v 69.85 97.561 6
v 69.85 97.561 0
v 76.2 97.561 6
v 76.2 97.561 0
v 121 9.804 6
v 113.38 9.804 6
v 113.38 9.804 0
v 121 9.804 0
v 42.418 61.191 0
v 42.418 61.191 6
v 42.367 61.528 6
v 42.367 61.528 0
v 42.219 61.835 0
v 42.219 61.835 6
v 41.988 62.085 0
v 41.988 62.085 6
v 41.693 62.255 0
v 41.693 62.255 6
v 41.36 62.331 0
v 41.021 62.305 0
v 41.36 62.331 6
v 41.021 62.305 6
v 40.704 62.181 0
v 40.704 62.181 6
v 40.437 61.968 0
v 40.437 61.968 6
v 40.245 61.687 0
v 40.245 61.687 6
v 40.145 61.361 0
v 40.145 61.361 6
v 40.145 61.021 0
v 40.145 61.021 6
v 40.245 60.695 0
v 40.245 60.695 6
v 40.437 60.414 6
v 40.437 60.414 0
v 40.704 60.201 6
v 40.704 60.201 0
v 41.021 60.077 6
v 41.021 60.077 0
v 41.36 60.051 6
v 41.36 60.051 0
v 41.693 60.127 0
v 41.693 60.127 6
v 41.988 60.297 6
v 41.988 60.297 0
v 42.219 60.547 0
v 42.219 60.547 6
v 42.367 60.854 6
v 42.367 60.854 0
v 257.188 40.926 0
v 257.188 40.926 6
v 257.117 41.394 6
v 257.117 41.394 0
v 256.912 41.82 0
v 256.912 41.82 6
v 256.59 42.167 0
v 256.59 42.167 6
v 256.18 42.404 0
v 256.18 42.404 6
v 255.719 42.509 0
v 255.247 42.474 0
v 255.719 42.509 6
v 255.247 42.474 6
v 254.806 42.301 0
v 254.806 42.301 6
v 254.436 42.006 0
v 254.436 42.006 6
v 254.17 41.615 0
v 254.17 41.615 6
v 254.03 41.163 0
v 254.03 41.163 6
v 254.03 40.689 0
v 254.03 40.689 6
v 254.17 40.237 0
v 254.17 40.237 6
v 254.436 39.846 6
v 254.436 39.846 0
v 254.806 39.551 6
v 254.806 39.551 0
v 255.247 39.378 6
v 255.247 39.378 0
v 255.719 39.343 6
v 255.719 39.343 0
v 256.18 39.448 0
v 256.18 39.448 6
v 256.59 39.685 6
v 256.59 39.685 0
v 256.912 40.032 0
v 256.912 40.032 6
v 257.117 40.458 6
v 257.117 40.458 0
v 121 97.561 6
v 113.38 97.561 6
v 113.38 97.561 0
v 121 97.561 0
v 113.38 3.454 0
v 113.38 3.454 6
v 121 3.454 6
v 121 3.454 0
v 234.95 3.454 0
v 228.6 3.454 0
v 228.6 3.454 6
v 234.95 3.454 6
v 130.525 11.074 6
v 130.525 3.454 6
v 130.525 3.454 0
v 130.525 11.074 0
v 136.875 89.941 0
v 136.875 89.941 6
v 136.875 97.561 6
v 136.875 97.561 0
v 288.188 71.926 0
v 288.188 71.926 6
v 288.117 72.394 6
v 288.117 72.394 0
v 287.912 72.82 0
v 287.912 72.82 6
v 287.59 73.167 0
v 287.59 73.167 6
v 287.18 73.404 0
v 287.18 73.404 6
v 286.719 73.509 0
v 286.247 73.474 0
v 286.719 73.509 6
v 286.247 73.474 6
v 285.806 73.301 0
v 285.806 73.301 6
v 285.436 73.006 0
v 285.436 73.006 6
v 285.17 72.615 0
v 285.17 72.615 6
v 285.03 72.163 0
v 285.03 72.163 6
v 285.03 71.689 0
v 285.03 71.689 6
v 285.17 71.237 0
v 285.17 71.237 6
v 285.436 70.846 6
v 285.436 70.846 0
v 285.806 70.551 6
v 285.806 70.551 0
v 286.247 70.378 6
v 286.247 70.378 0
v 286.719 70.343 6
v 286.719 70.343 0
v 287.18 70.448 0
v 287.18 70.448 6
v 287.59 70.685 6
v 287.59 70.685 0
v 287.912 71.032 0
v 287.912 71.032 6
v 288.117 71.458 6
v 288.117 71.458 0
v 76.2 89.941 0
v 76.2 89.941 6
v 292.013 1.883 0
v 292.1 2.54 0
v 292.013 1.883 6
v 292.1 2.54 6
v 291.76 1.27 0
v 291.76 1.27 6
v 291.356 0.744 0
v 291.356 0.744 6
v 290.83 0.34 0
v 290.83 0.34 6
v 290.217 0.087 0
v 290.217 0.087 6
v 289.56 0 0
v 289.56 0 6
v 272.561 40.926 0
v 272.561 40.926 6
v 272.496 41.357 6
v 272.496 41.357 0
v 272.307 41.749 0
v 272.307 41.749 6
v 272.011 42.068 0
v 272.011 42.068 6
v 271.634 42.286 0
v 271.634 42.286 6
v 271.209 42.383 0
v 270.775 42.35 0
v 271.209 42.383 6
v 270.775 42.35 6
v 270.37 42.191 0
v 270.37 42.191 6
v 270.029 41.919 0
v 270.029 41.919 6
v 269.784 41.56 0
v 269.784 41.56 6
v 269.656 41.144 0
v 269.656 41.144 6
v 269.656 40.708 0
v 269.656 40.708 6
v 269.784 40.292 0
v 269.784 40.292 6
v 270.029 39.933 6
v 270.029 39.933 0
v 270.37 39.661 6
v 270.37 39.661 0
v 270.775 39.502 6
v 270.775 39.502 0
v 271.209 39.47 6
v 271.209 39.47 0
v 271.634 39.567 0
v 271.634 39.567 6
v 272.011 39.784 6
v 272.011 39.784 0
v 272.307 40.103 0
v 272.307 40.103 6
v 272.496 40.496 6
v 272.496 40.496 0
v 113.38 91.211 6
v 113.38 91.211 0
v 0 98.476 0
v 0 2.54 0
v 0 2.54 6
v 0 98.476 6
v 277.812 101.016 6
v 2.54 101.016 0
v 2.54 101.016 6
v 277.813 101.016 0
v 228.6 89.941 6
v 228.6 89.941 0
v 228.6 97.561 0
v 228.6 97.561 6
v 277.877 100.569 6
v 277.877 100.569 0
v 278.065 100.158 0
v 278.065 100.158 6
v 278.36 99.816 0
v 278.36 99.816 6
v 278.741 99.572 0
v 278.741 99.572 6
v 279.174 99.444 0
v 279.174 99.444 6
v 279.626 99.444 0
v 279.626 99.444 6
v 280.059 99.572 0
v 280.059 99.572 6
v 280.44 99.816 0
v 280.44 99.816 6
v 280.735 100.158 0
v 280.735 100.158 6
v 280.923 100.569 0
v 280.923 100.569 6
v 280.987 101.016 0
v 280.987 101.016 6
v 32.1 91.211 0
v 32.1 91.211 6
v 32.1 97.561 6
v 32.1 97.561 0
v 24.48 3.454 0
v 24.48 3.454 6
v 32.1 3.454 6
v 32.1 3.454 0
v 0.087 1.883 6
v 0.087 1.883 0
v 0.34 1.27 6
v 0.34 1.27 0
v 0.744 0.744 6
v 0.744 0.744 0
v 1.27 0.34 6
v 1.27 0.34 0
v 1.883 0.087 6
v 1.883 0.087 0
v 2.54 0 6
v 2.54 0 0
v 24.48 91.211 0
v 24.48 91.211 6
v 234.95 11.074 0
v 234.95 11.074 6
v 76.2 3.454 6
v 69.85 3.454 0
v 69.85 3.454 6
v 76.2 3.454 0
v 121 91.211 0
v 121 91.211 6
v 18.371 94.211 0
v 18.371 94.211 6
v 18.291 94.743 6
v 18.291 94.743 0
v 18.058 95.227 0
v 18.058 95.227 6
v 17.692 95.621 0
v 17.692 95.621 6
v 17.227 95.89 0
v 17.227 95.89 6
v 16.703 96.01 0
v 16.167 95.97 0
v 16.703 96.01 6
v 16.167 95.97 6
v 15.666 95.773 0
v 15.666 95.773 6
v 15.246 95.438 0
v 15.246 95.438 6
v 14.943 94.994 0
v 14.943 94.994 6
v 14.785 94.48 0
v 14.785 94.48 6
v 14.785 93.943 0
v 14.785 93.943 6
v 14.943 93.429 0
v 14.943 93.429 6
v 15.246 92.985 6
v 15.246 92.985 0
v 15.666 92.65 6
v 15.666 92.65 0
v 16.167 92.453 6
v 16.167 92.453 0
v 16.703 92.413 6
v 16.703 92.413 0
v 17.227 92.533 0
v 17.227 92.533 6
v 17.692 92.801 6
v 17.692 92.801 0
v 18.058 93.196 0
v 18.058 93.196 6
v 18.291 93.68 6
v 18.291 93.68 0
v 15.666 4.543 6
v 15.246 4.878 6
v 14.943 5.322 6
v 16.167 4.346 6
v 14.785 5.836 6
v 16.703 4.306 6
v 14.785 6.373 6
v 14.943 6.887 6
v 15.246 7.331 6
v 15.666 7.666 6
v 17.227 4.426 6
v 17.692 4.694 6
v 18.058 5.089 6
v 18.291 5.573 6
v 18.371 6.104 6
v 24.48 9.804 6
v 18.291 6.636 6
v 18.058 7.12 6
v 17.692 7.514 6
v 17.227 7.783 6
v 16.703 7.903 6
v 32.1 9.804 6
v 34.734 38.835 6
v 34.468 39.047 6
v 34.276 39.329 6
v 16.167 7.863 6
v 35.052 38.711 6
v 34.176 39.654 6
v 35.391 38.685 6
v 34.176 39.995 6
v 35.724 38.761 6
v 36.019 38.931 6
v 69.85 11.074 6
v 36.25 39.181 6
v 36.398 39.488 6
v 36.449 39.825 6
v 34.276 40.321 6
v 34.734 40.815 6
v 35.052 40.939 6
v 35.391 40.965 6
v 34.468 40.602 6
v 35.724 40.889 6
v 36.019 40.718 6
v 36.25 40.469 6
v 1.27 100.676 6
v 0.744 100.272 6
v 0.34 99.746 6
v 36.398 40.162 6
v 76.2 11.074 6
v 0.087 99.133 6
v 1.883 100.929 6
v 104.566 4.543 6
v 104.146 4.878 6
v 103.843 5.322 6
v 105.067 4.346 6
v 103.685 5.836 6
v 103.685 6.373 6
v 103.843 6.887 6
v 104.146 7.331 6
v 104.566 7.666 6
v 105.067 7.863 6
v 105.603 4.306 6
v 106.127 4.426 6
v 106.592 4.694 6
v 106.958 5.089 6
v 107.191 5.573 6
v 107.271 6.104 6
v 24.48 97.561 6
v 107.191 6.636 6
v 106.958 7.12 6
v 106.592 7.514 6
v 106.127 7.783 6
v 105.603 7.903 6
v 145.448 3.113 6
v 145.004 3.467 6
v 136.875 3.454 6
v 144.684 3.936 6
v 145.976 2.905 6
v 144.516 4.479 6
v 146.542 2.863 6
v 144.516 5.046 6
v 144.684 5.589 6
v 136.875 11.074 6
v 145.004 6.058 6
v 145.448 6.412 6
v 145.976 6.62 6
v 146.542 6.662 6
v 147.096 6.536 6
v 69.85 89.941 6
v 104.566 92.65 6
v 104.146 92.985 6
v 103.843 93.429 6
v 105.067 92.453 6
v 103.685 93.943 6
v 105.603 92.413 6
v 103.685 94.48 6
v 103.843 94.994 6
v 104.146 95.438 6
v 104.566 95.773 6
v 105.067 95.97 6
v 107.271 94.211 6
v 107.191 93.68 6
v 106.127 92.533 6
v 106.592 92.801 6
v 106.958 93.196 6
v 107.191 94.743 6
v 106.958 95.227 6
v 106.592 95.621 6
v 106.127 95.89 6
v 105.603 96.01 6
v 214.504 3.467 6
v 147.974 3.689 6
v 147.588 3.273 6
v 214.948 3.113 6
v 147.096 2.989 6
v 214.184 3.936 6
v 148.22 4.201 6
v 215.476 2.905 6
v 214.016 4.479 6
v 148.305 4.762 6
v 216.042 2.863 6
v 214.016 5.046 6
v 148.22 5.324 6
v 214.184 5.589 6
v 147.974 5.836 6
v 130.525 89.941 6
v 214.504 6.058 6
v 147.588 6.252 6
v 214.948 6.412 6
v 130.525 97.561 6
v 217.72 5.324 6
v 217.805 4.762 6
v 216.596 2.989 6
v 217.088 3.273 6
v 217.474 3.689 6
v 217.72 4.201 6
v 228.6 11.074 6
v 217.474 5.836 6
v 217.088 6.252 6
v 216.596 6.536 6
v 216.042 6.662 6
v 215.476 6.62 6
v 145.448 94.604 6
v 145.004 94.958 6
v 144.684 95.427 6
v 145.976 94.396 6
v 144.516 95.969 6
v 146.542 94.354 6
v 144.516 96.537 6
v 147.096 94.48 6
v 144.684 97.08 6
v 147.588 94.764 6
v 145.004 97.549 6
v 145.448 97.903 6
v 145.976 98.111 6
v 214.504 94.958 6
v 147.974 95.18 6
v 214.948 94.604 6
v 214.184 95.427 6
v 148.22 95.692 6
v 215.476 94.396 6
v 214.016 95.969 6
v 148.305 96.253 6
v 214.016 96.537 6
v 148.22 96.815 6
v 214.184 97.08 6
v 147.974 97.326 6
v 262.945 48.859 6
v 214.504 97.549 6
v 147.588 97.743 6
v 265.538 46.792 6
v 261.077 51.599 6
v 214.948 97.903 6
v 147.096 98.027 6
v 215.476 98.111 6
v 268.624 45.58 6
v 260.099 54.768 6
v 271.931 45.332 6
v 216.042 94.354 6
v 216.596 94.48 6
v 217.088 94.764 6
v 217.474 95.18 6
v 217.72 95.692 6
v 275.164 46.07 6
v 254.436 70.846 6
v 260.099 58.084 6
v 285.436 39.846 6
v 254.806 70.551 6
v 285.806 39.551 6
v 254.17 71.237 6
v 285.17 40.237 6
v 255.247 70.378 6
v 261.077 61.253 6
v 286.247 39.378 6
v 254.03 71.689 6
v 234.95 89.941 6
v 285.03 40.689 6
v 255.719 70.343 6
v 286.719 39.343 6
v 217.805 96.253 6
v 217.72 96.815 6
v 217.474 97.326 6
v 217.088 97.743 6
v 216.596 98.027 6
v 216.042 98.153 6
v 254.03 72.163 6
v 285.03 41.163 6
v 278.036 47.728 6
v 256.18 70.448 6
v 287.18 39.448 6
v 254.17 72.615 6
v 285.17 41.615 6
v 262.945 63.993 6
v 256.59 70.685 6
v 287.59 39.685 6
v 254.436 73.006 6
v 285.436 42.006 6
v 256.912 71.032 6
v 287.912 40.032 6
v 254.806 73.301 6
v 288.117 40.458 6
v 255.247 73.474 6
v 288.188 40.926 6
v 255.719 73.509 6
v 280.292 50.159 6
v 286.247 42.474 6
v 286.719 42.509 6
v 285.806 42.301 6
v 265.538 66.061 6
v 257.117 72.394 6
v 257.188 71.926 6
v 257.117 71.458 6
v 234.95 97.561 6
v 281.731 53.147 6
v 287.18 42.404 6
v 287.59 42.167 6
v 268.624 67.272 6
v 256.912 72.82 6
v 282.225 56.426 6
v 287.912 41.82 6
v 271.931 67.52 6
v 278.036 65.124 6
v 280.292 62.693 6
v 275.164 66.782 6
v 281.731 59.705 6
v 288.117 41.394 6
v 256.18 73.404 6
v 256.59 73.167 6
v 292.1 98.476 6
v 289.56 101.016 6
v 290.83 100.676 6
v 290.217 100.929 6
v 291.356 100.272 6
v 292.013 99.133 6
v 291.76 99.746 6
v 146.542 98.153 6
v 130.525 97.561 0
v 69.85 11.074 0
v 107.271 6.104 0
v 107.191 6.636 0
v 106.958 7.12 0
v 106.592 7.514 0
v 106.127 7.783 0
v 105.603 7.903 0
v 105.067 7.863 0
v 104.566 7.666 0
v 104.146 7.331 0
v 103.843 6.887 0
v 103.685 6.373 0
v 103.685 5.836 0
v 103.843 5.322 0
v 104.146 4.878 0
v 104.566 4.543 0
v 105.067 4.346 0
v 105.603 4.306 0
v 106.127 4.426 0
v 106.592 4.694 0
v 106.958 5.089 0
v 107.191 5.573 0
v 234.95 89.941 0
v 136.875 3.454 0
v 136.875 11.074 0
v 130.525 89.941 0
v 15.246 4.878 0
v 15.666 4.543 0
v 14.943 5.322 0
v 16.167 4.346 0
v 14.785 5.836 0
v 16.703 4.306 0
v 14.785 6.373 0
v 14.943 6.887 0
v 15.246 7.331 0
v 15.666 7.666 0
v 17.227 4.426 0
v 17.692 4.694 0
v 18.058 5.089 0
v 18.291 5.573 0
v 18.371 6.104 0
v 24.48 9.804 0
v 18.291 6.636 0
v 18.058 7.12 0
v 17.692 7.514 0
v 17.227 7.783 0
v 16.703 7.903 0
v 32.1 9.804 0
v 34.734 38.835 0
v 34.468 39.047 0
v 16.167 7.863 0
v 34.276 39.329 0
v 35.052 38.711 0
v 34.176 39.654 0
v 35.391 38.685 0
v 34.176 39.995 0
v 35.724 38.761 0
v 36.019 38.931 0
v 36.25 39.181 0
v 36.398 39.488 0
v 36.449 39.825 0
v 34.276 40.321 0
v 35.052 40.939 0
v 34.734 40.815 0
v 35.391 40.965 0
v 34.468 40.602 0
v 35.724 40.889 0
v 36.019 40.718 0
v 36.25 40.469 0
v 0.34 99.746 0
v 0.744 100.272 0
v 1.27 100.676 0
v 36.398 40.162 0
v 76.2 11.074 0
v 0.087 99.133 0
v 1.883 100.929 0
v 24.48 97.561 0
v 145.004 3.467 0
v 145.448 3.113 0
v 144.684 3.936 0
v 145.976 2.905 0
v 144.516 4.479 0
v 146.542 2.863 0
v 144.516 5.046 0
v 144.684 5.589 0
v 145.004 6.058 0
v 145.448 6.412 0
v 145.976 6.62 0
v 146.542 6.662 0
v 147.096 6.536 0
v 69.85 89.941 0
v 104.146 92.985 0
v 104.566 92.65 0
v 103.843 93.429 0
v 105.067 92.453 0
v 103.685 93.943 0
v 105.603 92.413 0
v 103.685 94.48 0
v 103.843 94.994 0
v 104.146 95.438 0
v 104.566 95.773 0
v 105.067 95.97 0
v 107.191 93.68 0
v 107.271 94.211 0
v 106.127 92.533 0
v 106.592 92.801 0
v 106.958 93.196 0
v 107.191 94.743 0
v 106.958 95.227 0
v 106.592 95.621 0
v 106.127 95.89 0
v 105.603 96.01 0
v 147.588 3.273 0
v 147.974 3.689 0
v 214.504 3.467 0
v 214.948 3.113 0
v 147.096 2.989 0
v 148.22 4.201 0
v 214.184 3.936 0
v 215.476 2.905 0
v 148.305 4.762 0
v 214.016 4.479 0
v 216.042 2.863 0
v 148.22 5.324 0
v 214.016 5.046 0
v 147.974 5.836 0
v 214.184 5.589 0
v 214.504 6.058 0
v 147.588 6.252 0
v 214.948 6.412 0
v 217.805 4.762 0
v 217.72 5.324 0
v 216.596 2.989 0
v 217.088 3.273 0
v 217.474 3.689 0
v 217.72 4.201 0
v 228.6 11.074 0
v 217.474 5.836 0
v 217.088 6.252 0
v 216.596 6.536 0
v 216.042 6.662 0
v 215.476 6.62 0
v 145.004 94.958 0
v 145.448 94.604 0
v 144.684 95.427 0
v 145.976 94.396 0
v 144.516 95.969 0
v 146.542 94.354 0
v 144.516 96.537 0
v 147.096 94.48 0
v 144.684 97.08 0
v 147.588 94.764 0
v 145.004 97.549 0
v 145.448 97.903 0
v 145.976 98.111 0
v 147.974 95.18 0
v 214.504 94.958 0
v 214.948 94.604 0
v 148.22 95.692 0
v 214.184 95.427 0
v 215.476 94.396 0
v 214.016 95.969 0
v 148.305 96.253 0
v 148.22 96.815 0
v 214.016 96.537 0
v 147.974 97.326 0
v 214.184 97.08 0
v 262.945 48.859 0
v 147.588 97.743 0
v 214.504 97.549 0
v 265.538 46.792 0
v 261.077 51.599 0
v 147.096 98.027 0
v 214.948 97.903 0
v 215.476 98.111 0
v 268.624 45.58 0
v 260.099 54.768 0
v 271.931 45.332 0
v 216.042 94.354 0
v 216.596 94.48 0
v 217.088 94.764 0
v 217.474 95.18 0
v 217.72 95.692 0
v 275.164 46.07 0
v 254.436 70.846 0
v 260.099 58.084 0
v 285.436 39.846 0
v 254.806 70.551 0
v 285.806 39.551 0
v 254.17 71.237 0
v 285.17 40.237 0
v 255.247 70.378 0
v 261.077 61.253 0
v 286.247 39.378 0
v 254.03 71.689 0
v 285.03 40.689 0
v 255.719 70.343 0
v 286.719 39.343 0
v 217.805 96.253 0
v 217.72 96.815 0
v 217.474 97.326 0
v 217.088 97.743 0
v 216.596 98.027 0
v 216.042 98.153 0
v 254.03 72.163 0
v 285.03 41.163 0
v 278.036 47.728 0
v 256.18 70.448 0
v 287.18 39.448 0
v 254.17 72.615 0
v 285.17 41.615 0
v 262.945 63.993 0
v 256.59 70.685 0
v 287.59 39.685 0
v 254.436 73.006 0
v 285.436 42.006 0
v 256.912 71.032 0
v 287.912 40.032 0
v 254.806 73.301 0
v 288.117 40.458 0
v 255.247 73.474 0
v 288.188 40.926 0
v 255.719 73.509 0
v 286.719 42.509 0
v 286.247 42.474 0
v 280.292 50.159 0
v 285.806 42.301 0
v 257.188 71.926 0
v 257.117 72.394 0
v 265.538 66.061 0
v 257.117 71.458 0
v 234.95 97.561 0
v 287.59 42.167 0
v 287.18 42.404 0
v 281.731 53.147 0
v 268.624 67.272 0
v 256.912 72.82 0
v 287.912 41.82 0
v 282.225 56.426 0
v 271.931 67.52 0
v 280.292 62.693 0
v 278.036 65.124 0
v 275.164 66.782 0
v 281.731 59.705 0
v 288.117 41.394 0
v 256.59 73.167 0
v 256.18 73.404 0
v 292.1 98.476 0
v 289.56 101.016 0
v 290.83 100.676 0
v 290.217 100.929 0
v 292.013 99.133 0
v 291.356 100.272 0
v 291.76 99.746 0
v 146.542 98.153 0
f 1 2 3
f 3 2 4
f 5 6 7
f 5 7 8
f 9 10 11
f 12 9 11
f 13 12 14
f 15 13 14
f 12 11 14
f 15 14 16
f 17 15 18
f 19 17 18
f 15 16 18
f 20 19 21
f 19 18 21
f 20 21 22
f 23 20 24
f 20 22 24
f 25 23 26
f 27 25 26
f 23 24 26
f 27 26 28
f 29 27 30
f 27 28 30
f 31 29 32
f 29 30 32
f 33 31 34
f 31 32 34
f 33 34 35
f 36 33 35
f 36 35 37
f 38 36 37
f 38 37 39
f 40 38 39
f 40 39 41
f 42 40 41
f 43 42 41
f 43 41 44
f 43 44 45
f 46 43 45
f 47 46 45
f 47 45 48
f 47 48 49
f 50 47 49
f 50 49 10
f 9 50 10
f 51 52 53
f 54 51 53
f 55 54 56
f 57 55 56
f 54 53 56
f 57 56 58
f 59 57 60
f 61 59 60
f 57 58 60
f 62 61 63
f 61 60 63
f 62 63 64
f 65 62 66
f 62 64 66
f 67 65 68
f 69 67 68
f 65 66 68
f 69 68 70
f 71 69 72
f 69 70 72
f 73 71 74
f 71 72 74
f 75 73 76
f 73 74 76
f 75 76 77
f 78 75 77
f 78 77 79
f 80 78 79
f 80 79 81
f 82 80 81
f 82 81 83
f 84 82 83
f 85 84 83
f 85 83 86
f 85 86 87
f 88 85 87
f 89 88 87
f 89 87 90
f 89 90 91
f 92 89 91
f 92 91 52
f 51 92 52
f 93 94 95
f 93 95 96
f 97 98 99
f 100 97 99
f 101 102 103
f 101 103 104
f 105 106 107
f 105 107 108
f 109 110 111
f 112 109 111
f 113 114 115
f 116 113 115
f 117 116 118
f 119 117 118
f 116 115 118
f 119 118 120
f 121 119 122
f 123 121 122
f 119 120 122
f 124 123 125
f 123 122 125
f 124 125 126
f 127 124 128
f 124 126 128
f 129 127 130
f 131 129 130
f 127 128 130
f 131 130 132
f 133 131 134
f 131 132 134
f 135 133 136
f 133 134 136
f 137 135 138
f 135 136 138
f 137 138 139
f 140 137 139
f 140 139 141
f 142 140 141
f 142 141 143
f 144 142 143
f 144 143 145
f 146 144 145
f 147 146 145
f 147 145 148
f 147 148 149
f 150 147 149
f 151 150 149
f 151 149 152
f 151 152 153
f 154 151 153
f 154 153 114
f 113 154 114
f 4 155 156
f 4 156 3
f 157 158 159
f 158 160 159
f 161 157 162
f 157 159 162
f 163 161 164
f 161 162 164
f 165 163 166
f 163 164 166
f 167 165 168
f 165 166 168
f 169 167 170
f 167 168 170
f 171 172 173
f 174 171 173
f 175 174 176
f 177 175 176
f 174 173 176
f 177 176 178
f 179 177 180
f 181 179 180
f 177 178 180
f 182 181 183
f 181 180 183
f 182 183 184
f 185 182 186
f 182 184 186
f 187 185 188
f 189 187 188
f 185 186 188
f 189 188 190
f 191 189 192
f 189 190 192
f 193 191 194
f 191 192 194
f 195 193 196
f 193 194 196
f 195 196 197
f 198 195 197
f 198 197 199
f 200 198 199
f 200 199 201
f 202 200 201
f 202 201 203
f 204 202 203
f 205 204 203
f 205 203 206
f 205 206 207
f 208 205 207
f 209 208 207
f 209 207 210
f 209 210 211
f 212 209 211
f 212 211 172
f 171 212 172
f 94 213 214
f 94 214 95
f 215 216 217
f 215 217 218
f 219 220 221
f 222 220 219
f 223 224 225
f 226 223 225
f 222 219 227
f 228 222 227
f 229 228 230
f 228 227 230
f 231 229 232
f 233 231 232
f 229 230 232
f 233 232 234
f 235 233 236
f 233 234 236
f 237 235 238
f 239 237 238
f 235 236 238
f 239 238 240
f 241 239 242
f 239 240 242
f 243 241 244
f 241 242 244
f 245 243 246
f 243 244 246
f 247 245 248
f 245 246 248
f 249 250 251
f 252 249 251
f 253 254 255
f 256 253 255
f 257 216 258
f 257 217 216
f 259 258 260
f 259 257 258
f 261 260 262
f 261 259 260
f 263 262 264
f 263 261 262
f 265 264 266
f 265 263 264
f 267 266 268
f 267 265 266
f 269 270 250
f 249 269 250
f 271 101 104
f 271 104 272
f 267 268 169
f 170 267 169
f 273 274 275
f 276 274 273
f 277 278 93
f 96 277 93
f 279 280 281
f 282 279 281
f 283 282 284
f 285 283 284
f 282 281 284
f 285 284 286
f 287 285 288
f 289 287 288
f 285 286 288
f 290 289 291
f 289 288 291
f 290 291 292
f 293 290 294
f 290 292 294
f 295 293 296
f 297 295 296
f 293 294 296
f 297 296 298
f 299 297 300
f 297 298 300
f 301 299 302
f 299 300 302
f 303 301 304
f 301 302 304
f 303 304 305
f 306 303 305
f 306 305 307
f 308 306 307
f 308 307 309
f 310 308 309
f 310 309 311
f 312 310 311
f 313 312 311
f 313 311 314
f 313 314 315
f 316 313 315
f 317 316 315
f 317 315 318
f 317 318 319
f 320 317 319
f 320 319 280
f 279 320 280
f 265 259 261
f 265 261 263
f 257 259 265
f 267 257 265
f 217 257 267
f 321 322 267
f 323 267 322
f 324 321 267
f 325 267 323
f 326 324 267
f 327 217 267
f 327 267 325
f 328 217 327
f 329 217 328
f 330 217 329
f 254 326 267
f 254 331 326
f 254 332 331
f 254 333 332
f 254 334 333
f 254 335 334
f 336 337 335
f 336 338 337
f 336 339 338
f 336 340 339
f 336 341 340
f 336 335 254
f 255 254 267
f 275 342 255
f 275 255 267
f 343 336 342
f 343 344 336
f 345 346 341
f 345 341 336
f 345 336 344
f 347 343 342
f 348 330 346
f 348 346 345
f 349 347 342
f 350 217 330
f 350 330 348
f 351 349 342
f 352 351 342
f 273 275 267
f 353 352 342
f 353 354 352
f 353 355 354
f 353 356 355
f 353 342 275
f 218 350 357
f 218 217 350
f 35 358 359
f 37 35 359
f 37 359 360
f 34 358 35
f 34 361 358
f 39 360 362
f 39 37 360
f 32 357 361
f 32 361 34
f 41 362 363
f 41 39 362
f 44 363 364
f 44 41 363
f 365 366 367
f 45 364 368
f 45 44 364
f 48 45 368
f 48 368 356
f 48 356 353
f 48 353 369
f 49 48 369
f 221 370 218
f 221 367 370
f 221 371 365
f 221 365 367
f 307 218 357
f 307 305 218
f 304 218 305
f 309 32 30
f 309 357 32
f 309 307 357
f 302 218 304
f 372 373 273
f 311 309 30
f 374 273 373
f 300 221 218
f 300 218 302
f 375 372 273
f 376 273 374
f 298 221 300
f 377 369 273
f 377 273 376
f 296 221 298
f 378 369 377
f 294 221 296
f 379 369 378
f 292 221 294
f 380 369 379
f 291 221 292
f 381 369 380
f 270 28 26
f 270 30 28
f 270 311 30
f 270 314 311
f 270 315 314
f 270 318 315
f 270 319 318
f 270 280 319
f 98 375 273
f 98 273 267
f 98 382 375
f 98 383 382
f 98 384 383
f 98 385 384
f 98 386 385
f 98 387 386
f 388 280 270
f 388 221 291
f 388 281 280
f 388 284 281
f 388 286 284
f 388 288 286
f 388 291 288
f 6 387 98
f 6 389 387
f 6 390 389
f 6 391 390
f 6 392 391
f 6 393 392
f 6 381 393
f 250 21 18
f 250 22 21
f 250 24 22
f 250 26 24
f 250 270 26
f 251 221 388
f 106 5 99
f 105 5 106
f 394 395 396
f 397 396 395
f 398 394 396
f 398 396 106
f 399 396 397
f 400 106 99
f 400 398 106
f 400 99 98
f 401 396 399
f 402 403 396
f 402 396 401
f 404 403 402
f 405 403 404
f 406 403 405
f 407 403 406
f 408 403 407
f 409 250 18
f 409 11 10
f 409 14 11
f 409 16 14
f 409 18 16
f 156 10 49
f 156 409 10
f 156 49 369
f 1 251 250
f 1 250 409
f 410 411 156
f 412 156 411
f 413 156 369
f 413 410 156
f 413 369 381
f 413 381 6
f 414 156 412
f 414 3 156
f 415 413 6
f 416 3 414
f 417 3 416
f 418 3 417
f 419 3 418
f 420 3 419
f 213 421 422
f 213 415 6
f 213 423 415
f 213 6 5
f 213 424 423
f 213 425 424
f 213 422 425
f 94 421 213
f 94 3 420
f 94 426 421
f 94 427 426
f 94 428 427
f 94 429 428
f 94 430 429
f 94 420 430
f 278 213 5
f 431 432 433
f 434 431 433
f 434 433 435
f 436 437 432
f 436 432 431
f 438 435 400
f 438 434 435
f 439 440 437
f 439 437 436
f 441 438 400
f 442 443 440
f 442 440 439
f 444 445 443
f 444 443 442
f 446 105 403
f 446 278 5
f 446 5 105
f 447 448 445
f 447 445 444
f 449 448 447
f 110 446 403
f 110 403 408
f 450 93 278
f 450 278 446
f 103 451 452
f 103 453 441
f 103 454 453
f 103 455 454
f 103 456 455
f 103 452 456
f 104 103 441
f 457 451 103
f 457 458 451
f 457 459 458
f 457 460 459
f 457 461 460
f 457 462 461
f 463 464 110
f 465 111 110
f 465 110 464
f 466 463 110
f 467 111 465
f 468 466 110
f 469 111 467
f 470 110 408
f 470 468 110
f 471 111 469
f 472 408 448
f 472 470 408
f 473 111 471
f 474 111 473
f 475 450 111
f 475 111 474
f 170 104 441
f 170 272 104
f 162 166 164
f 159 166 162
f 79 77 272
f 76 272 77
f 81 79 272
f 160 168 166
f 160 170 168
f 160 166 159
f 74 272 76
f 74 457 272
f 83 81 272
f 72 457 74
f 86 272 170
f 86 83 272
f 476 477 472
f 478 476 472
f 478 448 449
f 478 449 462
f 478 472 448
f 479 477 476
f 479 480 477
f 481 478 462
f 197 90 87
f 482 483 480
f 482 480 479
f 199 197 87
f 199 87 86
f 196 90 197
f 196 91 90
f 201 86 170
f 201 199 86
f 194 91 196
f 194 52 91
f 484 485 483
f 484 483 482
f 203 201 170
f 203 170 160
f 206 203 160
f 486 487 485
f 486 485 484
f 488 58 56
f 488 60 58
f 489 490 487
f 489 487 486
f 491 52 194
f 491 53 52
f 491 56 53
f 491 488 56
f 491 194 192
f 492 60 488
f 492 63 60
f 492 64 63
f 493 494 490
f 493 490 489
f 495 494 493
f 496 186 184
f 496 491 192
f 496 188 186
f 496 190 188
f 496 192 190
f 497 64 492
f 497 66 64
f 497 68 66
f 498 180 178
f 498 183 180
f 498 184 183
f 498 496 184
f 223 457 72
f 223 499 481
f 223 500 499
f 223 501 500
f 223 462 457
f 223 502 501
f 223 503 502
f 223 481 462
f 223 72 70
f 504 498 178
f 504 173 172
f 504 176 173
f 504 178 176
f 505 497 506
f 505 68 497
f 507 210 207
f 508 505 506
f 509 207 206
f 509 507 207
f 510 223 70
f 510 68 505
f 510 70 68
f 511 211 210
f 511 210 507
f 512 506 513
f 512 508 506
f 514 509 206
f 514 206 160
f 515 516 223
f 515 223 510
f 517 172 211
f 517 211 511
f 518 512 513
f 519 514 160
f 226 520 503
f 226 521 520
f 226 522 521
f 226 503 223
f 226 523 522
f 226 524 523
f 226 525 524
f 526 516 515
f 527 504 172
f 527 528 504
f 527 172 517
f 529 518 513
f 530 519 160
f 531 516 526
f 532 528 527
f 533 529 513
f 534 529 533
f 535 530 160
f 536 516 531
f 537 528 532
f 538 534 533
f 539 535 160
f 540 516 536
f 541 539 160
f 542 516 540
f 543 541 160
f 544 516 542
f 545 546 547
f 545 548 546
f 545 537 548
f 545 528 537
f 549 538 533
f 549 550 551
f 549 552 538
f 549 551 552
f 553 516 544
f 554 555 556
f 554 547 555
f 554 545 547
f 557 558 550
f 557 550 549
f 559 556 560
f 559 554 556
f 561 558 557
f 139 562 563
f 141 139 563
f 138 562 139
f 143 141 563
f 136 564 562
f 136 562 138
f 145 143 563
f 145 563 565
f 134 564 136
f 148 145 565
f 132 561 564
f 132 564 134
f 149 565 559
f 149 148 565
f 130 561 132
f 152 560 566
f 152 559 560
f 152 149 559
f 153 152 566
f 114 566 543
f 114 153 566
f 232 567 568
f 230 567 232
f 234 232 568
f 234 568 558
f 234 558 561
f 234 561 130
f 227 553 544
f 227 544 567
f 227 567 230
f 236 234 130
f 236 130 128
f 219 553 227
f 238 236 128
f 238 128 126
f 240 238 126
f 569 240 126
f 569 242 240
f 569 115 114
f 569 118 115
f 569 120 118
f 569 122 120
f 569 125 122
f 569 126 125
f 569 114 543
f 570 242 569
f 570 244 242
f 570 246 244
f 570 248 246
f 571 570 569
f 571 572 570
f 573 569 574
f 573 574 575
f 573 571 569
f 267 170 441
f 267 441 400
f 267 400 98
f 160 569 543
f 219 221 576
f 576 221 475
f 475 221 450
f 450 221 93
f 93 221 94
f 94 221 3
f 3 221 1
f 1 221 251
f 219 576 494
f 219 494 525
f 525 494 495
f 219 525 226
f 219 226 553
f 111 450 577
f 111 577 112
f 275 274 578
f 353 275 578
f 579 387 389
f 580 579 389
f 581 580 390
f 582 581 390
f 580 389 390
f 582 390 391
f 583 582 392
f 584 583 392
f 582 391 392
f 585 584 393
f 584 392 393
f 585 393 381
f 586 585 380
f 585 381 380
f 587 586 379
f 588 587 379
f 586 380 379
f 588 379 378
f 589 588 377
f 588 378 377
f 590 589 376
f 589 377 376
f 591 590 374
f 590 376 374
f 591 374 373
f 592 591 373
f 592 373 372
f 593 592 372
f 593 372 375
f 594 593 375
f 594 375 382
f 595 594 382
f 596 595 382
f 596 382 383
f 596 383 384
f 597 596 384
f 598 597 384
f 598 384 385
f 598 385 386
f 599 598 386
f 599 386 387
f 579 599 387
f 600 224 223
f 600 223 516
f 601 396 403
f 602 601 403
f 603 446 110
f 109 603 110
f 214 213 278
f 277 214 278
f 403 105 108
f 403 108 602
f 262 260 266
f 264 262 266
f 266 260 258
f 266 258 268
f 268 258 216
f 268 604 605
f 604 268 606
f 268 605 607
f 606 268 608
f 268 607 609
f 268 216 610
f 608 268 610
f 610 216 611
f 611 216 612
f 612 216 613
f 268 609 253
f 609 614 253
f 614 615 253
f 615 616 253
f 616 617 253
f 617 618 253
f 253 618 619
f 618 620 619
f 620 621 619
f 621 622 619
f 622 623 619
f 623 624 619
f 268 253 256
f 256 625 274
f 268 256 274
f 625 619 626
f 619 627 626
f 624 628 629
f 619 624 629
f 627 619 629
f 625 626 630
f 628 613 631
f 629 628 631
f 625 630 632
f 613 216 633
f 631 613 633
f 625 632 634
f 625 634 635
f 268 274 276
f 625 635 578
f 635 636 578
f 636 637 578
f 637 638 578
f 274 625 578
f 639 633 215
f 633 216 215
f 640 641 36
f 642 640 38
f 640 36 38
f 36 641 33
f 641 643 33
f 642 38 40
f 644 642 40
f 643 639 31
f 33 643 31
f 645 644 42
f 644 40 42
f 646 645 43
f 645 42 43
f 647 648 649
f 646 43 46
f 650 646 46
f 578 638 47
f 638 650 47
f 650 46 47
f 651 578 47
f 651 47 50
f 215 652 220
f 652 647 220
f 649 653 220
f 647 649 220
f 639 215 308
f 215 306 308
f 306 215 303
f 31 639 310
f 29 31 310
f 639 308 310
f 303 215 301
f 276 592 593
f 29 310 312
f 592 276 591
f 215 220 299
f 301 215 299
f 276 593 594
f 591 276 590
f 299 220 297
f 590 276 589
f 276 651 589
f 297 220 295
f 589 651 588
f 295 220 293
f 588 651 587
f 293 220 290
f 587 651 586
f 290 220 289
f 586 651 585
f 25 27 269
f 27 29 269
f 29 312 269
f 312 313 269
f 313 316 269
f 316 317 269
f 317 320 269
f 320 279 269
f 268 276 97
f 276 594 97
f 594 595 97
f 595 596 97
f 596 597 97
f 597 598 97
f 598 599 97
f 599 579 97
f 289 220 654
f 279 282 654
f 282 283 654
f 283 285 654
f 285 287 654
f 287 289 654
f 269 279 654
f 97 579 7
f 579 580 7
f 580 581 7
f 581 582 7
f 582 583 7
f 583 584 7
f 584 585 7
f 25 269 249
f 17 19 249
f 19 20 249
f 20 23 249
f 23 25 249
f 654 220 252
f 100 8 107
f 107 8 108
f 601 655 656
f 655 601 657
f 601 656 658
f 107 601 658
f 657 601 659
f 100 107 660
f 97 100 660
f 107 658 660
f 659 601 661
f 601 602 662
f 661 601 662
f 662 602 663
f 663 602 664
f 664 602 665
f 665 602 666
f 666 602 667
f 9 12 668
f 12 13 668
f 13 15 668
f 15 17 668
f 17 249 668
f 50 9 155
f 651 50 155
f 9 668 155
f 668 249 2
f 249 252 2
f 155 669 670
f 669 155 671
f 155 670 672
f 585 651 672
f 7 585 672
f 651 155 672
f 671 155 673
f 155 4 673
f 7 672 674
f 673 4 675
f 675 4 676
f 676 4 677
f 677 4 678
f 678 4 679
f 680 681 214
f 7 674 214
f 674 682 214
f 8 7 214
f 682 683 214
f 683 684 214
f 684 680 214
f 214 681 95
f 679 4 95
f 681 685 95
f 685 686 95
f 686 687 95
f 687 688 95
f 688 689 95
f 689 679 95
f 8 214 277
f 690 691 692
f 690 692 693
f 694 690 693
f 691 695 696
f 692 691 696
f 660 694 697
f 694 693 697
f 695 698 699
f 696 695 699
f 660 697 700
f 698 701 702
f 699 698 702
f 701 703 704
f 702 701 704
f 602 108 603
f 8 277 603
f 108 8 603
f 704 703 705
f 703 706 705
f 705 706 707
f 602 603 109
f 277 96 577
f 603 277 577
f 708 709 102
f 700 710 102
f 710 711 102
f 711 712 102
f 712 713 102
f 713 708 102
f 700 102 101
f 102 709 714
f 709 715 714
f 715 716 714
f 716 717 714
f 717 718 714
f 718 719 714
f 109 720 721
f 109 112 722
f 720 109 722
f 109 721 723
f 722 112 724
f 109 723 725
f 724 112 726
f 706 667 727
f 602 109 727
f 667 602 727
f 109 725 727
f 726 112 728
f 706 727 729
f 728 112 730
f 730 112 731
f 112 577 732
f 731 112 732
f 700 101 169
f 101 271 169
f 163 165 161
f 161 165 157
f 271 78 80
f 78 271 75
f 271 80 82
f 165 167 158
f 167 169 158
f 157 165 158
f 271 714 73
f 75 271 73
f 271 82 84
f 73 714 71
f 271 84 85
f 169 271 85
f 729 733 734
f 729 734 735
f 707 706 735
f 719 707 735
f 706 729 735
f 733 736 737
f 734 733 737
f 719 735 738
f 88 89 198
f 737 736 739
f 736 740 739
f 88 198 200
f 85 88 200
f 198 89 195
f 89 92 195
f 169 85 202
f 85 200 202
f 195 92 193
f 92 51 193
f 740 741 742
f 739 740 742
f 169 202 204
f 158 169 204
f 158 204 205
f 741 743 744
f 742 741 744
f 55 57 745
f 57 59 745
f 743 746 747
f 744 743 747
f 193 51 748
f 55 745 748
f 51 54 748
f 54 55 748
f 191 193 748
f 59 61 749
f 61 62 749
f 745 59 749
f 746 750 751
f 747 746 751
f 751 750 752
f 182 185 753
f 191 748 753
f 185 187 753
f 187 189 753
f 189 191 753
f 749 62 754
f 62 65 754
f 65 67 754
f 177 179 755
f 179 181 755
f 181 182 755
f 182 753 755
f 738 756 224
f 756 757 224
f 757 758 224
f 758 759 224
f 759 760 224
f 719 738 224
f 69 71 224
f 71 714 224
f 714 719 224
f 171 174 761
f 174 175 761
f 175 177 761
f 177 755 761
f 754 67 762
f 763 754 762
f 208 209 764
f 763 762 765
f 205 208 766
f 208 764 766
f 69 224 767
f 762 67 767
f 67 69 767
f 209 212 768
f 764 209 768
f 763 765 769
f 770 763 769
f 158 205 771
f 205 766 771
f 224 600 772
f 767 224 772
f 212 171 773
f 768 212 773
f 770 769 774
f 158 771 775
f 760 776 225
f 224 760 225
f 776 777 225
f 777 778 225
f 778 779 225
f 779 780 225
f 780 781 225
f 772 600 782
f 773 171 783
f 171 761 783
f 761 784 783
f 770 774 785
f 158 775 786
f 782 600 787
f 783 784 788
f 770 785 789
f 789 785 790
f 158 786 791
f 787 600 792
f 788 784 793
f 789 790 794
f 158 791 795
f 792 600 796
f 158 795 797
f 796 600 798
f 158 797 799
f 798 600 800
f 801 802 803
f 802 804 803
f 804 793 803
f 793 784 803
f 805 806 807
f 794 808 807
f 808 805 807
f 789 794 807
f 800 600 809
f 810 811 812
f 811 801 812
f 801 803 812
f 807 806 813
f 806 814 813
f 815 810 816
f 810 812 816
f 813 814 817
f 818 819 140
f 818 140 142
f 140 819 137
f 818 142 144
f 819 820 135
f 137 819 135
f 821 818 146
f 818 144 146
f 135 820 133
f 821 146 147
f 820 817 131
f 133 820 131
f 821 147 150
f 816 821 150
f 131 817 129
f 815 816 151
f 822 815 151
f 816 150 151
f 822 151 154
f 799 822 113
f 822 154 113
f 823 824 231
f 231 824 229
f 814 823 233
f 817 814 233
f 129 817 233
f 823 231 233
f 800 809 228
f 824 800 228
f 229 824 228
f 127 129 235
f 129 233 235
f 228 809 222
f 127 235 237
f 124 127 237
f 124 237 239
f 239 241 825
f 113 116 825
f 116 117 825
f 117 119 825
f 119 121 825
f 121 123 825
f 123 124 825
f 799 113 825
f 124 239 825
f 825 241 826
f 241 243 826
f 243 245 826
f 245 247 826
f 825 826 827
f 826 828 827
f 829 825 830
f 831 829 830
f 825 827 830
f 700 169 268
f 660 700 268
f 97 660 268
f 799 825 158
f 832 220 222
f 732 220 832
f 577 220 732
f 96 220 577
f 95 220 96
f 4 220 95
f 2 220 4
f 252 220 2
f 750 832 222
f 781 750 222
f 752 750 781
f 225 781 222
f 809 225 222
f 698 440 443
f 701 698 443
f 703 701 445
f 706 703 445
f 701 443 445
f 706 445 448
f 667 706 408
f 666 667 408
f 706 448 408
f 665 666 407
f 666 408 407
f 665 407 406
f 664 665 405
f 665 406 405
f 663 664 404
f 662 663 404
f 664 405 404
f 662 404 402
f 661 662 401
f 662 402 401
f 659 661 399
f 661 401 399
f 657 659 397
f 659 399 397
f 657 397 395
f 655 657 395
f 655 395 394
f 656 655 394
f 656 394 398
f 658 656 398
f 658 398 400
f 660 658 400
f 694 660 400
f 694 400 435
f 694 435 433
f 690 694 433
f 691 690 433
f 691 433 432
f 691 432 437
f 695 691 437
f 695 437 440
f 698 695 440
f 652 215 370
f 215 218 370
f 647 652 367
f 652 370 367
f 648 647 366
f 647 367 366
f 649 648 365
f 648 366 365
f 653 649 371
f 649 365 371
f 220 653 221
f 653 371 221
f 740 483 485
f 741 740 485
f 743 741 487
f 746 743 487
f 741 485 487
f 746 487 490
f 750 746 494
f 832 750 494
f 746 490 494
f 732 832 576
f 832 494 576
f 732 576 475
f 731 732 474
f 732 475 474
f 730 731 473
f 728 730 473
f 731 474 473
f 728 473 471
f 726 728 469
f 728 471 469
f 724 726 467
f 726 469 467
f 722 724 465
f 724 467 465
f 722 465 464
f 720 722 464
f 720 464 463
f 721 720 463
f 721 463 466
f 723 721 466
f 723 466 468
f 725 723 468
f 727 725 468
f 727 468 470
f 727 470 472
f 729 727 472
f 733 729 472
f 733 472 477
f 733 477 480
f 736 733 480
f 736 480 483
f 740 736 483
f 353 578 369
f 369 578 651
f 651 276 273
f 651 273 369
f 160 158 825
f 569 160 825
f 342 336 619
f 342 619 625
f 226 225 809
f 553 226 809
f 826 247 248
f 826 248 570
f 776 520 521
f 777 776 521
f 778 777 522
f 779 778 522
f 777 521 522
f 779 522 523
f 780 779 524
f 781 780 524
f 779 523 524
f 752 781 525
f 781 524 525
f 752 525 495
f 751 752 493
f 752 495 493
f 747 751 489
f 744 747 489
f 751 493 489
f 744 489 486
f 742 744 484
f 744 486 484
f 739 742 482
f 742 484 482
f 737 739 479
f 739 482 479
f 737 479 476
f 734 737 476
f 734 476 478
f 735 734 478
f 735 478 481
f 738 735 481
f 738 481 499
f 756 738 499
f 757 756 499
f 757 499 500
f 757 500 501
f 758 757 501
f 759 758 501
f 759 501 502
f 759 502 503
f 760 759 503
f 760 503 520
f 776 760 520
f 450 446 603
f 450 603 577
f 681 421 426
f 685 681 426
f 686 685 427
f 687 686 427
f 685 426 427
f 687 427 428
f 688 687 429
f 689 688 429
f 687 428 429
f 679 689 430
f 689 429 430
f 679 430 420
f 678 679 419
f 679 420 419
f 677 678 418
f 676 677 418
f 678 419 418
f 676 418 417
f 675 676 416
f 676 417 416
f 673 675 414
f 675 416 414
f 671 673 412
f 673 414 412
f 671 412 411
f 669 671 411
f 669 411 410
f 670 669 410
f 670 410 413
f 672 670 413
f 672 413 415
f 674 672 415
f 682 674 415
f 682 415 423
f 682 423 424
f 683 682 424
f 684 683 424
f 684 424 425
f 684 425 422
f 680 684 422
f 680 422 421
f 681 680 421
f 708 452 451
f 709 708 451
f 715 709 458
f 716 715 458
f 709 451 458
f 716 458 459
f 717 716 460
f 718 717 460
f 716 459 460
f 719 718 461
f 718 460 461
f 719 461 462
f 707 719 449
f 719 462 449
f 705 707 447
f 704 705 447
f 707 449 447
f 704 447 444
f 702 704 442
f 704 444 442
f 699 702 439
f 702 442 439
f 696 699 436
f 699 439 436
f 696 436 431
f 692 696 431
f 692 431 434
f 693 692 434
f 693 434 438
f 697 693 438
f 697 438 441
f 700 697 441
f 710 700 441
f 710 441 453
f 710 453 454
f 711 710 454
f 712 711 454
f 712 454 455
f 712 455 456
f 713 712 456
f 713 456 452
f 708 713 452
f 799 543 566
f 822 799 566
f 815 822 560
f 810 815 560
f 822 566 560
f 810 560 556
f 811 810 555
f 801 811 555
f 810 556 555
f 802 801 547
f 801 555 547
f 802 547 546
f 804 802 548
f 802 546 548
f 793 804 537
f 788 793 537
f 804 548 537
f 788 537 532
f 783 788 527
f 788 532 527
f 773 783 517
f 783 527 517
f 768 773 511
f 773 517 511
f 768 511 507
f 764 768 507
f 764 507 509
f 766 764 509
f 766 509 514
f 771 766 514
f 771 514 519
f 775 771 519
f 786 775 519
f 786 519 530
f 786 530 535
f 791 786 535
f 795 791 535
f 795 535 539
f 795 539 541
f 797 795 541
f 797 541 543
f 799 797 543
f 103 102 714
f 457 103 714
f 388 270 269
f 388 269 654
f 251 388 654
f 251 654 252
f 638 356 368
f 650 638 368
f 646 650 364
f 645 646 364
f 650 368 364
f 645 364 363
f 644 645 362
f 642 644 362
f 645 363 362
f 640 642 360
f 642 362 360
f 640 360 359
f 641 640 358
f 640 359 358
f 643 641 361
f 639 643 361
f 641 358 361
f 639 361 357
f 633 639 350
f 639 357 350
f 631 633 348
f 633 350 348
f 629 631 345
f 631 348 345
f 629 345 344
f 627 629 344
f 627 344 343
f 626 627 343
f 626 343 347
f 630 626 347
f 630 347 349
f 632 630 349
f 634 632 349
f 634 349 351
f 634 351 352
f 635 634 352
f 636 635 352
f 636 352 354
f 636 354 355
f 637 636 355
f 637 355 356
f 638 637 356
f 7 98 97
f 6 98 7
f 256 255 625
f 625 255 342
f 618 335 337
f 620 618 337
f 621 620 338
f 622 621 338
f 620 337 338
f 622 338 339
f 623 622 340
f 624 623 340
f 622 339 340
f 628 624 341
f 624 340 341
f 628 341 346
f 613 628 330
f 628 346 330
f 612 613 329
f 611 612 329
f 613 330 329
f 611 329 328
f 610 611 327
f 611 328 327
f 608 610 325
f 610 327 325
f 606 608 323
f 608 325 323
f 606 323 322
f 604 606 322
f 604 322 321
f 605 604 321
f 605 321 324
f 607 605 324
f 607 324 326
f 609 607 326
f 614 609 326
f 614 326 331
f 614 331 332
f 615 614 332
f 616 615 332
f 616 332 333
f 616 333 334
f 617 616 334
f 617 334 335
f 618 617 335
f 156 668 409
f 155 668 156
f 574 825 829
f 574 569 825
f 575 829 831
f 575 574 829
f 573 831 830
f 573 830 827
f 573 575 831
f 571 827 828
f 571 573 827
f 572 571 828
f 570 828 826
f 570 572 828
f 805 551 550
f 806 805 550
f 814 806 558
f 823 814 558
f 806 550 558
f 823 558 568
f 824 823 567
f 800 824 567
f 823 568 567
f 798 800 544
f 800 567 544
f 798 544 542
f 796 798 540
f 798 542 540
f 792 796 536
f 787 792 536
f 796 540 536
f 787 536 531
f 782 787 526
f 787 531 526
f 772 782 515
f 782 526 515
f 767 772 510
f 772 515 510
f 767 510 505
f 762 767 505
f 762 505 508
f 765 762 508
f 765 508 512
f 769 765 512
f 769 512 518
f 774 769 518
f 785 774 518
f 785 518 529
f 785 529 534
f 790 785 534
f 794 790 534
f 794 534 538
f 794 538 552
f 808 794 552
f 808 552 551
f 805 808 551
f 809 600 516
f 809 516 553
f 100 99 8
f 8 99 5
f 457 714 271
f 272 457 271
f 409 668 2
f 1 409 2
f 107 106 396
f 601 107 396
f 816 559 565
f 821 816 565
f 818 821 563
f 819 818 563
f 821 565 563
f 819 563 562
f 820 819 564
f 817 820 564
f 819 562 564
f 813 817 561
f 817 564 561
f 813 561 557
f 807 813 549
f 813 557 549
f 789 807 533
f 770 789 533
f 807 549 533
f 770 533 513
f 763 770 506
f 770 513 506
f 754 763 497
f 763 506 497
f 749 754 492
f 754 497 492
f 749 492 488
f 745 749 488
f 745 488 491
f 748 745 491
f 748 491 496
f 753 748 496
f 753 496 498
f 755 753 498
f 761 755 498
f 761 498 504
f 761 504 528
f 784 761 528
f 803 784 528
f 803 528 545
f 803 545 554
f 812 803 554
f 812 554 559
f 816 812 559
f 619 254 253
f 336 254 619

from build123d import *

# Parameters (mm, degrees)
SKETCH1_W           = 292.1
SKETCH1_H           = 101.0158
SKETCH1_W_2         = 6.35
SKETCH1_H_2         = 7.62
BOSS_EXTRUDE1_DEPTH = 6
SKETCH2_R           = 11.125
SKETCH2_R_2         = 1.5875
SKETCH2_R_3         = 1.4605
CUT_EXTRUDE1_DEPTH  = 310.132013628
SKETCH3_W           = 7.62
SKETCH3_H           = 6
CUT_EXTRUDE2_DEPTH  = 310.132013628
SKETCH4_W           = 7.62
SKETCH4_H           = 0.35
CUT_EXTRUDE3_DEPTH  = 6
FILLET1_R           = 2.54
SKETCH5_R           = 1.143
CUT_EXTRUDE4_DEPTH  = 310.132013628
SKETCH6_R           = 1.905
SKETCH6_W           = 6.35
SKETCH6_H           = 7.62
CUT_EXTRUDE5_DEPTH  = 310.132013628
SKETCH7_R           = 1.8034
CUT_EXTRUDE6_DEPTH  = 310.132013628
SKETCH8_R           = 1.5875
CUT_EXTRUDE7_DEPTH  = 310.132013628


with BuildPart() as part:
    # Sketch1 → Boss-Extrude1 (new body)
    with BuildSketch(Plane.XY):
        with Locations((146.05, 50.5079)):
            Rectangle(SKETCH1_W, SKETCH1_H)
        with Locations((231.775, 93.7514)):
            Rectangle(SKETCH1_W_2, SKETCH1_H_2, mode=Mode.SUBTRACT)
        with Locations((73.025, 93.7514)):
            Rectangle(SKETCH1_W_2, SKETCH1_H_2, mode=Mode.SUBTRACT)
        with Locations((231.775, 7.2644)):
            Rectangle(SKETCH1_W_2, SKETCH1_H_2, mode=Mode.SUBTRACT)
        with Locations((73.025, 7.2644)):
            Rectangle(SKETCH1_W_2, SKETCH1_H_2, mode=Mode.SUBTRACT)
    extrude(amount=BOSS_EXTRUDE1_DEPTH)

    # Sketch2 → Cut-Extrude1 (cut, through all)
    with BuildSketch(Plane.XY.offset(6)):
        with Locations((271.1, 56.4261)):
            Circle(SKETCH2_R)
        with Locations((255.6, 71.9261)):
            Circle(SKETCH2_R_2)
        with Locations((255.6, 40.9261)):
            Circle(SKETCH2_R_2)
        with Locations((286.6, 40.9261)):
            Circle(SKETCH2_R_2)
        with Locations((286.6, 71.9261)):
            Circle(SKETCH2_R_2)
        with Locations((271.1, 40.9261)):
            Circle(SKETCH2_R_3)
    extrude(amount=-CUT_EXTRUDE1_DEPTH, mode=Mode.SUBTRACT)

    # Sketch3 → Cut-Extrude2 (cut, through all)
    with BuildSketch(Plane.XY.offset(6)):
        with Locations((117.19, 94.5614)):
            Rectangle(SKETCH3_W, SKETCH3_H)
        with Locations((117.19, 6.4544)):
            Rectangle(SKETCH3_W, SKETCH3_H)
        with Locations((28.29, 6.4544)):
            Rectangle(SKETCH3_W, SKETCH3_H)
        with Locations((28.29, 94.5614)):
            Rectangle(SKETCH3_W, SKETCH3_H)
    extrude(amount=-CUT_EXTRUDE2_DEPTH, mode=Mode.SUBTRACT)

    # Sketch4 → Cut-Extrude3 (cut)
    with BuildSketch(Plane.XY.offset(6)):
        with Locations((28.29, 91.3864)):
            Rectangle(SKETCH4_W, SKETCH4_H)
        with Locations((28.29, 9.6294)):
            Rectangle(SKETCH4_W, SKETCH4_H)
        with Locations((117.19, 9.6294)):
            Rectangle(SKETCH4_W, SKETCH4_H)
        with Locations((117.19, 91.3864)):
            Rectangle(SKETCH4_W, SKETCH4_H)
    extrude(amount=-CUT_EXTRUDE3_DEPTH, mode=Mode.SUBTRACT)

    # Fillet1
    fillet1_edges = [part.edges().sort_by_distance(p)[0] for p in [
        (0, 101.0158, 3),
        (292.1, 101.0158, 3),
        (292.1, 0, 3),
        (0, 0, 3),
    ]]
    fillet(fillet1_edges, radius=FILLET1_R)

    # Sketch5 → Cut-Extrude4 (cut, through all)
    with BuildSketch(Plane.XY.offset(6)):
        with Locations((35.306, 39.824852294)):
            Circle(SKETCH5_R)
        with Locations((41.275, 61.190947706)):
            Circle(SKETCH5_R)
    extrude(amount=-CUT_EXTRUDE4_DEPTH, mode=Mode.SUBTRACT)

    # Sketch6 → Cut-Extrude5 (cut, through all)
    with BuildSketch(Plane.XY.offset(6)):
        with Locations((146.4, 96.2533)):
            Circle(SKETCH6_R)
        with Locations((215.9, 96.2533)):
            Circle(SKETCH6_R)
        with Locations((215.9, 4.7625)):
            Circle(SKETCH6_R)
        with Locations((146.4, 4.7625)):
            Circle(SKETCH6_R)
        with Locations((133.7, 93.7514)):
            Rectangle(SKETCH6_W, SKETCH6_H)
        with Locations((133.7, 7.2644)):
            Rectangle(SKETCH6_W, SKETCH6_H)
    extrude(amount=-CUT_EXTRUDE5_DEPTH, mode=Mode.SUBTRACT)

    # Sketch7 → Cut-Extrude6 (cut, through all)
    with BuildSketch(Plane.XY.offset(6)):
        with Locations((16.5679, 94.2114)):
            Circle(SKETCH7_R)
        with Locations((105.4679, 94.2114)):
            Circle(SKETCH7_R)
        with Locations((105.4679, 6.1044)):
            Circle(SKETCH7_R)
        with Locations((16.5679, 6.1044)):
            Circle(SKETCH7_R)
    extrude(amount=-CUT_EXTRUDE6_DEPTH, mode=Mode.SUBTRACT)

    # Sketch8 → Cut-Extrude7 (cut, through all)
    with BuildSketch(Plane.XY.offset(6)):
        with Locations((279.4, 101.0158)):
            Circle(SKETCH8_R)
    extrude(amount=-CUT_EXTRUDE7_DEPTH, mode=Mode.SUBTRACT)


solid = part.part
